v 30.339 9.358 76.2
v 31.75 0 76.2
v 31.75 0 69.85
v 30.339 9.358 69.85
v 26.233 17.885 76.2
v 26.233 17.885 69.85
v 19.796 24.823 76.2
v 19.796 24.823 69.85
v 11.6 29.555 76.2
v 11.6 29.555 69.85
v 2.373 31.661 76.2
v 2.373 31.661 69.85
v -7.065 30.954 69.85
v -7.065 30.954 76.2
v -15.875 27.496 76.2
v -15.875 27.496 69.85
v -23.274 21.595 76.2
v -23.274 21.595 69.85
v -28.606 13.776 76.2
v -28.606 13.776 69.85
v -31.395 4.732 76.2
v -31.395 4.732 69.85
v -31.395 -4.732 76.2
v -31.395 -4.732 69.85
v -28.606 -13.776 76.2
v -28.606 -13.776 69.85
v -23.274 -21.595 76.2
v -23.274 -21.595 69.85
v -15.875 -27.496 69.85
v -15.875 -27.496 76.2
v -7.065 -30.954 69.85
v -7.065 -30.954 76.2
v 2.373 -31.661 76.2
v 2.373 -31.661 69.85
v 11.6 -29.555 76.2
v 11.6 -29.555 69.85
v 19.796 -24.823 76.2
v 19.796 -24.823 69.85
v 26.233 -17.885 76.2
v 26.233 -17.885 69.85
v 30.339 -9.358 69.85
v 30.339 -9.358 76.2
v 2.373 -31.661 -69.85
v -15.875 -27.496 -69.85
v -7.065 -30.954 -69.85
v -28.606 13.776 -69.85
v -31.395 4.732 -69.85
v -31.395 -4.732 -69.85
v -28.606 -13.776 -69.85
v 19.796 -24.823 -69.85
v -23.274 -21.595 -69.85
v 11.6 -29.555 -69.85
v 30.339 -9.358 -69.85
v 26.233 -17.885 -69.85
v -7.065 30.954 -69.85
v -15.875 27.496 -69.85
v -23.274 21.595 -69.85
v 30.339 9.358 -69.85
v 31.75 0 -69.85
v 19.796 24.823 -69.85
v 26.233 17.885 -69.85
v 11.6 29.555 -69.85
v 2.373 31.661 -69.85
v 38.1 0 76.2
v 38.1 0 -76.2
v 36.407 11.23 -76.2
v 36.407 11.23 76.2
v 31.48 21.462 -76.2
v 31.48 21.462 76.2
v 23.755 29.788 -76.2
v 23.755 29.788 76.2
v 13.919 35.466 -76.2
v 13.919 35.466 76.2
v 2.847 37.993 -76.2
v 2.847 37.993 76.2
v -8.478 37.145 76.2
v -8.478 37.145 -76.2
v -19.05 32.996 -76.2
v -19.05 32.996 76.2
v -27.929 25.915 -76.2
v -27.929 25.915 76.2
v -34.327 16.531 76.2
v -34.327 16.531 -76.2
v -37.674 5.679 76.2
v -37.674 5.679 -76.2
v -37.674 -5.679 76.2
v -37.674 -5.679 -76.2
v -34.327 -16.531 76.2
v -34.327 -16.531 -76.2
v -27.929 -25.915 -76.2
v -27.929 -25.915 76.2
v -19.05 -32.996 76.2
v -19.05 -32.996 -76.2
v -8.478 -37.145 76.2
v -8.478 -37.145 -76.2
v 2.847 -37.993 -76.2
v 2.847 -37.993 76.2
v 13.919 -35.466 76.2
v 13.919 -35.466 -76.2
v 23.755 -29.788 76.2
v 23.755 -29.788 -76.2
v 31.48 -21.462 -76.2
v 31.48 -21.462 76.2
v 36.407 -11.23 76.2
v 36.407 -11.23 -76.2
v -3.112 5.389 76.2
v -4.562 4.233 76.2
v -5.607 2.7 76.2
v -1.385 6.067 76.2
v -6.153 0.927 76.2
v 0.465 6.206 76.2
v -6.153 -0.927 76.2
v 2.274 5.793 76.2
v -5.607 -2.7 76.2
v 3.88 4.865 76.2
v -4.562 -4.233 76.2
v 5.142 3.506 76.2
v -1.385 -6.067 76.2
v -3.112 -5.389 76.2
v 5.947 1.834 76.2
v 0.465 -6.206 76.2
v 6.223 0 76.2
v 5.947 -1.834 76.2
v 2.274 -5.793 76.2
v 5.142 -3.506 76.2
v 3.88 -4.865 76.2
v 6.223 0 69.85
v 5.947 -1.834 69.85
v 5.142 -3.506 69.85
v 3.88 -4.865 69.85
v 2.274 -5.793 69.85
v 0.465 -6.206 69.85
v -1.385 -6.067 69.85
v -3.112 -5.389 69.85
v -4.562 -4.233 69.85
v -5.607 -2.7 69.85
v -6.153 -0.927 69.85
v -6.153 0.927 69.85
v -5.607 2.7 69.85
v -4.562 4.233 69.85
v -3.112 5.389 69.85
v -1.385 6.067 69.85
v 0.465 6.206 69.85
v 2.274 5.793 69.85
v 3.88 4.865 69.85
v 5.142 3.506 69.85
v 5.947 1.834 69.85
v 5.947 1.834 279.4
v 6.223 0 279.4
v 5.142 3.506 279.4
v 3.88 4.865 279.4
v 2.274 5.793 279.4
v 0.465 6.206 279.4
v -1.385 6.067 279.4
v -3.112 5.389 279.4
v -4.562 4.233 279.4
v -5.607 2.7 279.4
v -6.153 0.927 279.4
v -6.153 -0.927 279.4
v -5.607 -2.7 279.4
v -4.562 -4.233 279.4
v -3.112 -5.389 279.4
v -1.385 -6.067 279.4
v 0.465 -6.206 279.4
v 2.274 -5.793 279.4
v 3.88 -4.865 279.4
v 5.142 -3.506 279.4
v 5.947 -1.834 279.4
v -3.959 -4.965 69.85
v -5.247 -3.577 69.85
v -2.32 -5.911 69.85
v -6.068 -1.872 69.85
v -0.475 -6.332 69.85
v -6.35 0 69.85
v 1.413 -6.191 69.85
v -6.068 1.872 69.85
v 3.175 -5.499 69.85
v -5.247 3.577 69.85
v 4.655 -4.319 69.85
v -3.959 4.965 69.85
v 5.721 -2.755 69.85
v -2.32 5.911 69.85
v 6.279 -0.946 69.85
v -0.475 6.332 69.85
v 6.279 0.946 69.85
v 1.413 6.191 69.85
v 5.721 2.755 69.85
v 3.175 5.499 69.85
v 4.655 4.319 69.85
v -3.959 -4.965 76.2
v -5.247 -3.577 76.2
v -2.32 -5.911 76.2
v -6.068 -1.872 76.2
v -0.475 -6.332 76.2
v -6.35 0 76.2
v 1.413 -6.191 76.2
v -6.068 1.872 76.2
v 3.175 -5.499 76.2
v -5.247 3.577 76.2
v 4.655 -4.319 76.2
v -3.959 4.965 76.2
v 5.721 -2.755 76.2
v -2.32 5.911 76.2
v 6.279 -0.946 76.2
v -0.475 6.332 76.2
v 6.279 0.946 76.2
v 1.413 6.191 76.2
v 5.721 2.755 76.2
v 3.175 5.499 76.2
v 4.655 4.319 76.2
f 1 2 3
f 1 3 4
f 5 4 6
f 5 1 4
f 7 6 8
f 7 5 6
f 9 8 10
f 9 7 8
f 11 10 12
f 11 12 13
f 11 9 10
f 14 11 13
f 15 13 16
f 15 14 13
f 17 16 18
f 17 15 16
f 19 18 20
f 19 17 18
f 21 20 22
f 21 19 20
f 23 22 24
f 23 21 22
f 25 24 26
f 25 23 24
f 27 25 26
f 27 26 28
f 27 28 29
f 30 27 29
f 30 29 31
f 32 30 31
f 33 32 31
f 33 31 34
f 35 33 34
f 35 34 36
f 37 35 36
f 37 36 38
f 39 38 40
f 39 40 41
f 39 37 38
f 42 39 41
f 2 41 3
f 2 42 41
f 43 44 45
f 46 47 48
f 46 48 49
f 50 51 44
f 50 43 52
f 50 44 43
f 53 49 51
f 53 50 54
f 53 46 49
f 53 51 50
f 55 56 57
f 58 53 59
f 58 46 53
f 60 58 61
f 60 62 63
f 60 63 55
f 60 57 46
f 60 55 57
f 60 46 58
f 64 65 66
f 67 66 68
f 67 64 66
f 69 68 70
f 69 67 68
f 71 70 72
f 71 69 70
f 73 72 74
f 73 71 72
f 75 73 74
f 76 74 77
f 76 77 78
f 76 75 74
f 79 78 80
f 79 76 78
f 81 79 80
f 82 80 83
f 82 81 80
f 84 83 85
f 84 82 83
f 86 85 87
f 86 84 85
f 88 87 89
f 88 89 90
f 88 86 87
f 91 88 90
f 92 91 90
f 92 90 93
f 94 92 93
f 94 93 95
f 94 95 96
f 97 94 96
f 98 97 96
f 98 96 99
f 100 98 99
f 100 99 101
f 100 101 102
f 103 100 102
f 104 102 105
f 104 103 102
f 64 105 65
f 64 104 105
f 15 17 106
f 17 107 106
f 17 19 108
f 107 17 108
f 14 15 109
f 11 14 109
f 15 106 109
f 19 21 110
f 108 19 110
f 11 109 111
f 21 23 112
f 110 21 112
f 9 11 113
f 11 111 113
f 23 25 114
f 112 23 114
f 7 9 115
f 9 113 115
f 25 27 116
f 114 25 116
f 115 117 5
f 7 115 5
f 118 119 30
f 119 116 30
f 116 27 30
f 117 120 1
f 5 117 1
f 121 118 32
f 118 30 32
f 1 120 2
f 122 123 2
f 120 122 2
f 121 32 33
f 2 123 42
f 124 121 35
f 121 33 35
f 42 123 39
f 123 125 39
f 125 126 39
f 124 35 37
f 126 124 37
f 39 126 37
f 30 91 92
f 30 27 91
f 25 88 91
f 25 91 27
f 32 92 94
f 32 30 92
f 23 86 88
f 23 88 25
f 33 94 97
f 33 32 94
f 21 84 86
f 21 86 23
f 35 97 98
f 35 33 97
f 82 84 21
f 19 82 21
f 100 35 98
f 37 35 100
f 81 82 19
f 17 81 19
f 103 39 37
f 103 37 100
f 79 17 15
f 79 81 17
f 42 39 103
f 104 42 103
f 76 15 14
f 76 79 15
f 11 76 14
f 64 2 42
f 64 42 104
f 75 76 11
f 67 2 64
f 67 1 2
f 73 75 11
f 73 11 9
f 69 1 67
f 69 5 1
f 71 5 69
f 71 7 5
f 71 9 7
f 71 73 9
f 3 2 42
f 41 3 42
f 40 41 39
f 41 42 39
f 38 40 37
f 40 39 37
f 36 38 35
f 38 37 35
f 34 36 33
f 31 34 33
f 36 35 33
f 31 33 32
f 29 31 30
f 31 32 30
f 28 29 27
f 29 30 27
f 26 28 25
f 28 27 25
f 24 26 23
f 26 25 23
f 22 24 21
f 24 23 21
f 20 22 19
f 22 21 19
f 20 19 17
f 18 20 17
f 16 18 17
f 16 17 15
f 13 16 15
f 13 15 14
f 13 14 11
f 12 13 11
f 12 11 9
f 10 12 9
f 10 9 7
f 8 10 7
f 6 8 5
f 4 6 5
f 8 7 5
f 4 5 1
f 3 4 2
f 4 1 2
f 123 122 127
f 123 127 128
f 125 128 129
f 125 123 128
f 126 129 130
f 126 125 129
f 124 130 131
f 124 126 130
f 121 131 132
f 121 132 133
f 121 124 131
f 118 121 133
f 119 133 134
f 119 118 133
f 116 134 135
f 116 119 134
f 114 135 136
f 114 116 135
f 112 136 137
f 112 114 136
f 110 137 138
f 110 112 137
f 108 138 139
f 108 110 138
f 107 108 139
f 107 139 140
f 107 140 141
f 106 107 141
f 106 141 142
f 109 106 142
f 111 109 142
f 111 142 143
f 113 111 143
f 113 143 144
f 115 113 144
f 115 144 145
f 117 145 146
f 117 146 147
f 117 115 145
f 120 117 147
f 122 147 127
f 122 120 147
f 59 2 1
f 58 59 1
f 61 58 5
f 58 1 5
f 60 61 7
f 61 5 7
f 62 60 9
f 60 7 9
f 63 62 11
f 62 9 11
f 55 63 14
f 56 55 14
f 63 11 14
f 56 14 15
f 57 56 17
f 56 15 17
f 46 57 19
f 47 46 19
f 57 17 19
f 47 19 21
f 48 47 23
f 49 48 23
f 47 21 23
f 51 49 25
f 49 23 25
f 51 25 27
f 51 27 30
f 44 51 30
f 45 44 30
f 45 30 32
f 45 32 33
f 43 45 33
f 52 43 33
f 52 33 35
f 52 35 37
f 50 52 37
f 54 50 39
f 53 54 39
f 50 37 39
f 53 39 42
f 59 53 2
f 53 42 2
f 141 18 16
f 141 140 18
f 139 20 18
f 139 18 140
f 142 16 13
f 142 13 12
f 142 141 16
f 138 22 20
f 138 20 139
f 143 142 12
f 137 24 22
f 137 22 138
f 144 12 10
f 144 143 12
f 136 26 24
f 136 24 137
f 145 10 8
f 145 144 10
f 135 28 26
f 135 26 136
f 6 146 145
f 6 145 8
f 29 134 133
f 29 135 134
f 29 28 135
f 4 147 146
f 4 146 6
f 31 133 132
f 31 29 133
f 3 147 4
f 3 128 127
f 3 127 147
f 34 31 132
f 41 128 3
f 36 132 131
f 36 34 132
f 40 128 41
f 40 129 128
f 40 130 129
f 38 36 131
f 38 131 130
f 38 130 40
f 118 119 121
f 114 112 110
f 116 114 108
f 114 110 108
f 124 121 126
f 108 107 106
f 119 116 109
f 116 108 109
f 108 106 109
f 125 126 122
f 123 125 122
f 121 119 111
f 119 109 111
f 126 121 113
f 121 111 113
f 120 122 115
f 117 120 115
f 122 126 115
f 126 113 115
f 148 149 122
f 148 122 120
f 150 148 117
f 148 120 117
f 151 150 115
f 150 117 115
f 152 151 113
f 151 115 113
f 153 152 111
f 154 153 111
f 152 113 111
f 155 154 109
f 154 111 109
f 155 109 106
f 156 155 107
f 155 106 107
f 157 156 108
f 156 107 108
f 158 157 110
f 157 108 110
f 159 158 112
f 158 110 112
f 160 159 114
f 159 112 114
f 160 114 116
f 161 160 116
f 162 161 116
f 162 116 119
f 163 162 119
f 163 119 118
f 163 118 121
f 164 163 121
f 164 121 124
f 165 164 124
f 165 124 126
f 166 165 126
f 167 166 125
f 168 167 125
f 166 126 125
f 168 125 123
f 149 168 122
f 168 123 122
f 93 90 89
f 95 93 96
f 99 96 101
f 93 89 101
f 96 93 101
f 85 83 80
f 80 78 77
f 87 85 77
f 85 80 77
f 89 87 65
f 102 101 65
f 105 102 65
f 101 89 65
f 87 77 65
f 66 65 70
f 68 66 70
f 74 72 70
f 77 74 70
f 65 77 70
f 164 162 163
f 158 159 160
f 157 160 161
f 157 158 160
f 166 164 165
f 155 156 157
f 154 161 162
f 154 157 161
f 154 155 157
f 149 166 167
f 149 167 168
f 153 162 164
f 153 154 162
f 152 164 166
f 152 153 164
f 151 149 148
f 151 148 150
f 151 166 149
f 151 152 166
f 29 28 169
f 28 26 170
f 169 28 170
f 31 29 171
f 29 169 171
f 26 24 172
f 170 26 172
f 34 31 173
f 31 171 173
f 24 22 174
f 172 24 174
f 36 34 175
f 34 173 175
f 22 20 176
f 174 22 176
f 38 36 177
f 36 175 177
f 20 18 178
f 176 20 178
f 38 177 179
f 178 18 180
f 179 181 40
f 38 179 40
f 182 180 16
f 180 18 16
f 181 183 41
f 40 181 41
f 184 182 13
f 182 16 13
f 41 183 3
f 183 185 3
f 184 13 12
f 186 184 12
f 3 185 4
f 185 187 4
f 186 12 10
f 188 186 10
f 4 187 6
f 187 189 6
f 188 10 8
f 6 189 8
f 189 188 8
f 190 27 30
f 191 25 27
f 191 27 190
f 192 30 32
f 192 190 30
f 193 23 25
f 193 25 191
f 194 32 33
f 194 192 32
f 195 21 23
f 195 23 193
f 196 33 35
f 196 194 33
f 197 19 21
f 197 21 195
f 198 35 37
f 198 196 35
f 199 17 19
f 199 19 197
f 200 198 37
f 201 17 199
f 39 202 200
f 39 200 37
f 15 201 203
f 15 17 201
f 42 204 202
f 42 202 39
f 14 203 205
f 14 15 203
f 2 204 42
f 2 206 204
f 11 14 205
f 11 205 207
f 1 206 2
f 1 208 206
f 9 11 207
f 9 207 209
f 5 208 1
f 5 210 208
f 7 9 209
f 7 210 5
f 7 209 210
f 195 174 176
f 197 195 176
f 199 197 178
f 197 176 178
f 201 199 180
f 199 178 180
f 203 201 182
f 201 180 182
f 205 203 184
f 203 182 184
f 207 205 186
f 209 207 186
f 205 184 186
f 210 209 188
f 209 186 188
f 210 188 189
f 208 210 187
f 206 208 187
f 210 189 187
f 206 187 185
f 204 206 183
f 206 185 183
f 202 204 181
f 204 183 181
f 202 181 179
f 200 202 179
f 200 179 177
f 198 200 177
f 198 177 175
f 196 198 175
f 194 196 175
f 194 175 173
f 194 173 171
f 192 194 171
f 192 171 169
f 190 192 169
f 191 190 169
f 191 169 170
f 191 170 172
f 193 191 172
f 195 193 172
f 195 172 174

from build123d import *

# Parameters (mm, degrees)
F0_R     = 38.1
F1_DEPTH = 76.2
F2_T     = -6.35
F3_R     = 31.75
F4_DEPTH = 6.35
F5_D     = 12.7
F6_R     = 6.223
F7_DEPTH = 203.2
F8_R     = 31.75
F8_R_2   = 6.223
F9_DEPTH = 6.35


with BuildPart() as f1:
    # F0 (on Top) → F1 (new body, symmetric)
    with BuildSketch(Plane.XY):
        Circle(F0_R)
    extrude(amount=F1_DEPTH, both=True)

    # F2
    f2_openings = [f1.faces().sort_by_distance(p)[0] for p in [
        (0, 0, 76.2),
    ]]
    offset(amount=F2_T, openings=f2_openings)


with BuildPart() as f4:
    # F3 (on face) → F4 (new body)
    with BuildSketch(Plane.XY.offset(76.2)):
        Circle(F3_R)
    extrude(amount=-F4_DEPTH)

    # F5 (through all)
    with Locations(Plane.XY.offset(76.2)):
        with Locations((0, 0)):
            Hole(F5_D / 2)


with BuildPart() as f7:
    # F6 (on face) → F7 (new body)
    with BuildSketch(Plane.XY.offset(76.2)):
        Circle(F6_R)
    extrude(amount=F7_DEPTH)


with BuildPart() as f9:
    # F8 (on face) → F9 (new body)
    with BuildSketch(Plane(origin=(0, 0, 76.2), x_dir=(1, 0, 0), z_dir=(0, 0, -1))):
        Circle(F8_R)
        Circle(F8_R_2, mode=Mode.SUBTRACT)
    extrude(amount=F9_DEPTH)


solid = Compound([f1.part, f4.part, f7.part, f9.part])
